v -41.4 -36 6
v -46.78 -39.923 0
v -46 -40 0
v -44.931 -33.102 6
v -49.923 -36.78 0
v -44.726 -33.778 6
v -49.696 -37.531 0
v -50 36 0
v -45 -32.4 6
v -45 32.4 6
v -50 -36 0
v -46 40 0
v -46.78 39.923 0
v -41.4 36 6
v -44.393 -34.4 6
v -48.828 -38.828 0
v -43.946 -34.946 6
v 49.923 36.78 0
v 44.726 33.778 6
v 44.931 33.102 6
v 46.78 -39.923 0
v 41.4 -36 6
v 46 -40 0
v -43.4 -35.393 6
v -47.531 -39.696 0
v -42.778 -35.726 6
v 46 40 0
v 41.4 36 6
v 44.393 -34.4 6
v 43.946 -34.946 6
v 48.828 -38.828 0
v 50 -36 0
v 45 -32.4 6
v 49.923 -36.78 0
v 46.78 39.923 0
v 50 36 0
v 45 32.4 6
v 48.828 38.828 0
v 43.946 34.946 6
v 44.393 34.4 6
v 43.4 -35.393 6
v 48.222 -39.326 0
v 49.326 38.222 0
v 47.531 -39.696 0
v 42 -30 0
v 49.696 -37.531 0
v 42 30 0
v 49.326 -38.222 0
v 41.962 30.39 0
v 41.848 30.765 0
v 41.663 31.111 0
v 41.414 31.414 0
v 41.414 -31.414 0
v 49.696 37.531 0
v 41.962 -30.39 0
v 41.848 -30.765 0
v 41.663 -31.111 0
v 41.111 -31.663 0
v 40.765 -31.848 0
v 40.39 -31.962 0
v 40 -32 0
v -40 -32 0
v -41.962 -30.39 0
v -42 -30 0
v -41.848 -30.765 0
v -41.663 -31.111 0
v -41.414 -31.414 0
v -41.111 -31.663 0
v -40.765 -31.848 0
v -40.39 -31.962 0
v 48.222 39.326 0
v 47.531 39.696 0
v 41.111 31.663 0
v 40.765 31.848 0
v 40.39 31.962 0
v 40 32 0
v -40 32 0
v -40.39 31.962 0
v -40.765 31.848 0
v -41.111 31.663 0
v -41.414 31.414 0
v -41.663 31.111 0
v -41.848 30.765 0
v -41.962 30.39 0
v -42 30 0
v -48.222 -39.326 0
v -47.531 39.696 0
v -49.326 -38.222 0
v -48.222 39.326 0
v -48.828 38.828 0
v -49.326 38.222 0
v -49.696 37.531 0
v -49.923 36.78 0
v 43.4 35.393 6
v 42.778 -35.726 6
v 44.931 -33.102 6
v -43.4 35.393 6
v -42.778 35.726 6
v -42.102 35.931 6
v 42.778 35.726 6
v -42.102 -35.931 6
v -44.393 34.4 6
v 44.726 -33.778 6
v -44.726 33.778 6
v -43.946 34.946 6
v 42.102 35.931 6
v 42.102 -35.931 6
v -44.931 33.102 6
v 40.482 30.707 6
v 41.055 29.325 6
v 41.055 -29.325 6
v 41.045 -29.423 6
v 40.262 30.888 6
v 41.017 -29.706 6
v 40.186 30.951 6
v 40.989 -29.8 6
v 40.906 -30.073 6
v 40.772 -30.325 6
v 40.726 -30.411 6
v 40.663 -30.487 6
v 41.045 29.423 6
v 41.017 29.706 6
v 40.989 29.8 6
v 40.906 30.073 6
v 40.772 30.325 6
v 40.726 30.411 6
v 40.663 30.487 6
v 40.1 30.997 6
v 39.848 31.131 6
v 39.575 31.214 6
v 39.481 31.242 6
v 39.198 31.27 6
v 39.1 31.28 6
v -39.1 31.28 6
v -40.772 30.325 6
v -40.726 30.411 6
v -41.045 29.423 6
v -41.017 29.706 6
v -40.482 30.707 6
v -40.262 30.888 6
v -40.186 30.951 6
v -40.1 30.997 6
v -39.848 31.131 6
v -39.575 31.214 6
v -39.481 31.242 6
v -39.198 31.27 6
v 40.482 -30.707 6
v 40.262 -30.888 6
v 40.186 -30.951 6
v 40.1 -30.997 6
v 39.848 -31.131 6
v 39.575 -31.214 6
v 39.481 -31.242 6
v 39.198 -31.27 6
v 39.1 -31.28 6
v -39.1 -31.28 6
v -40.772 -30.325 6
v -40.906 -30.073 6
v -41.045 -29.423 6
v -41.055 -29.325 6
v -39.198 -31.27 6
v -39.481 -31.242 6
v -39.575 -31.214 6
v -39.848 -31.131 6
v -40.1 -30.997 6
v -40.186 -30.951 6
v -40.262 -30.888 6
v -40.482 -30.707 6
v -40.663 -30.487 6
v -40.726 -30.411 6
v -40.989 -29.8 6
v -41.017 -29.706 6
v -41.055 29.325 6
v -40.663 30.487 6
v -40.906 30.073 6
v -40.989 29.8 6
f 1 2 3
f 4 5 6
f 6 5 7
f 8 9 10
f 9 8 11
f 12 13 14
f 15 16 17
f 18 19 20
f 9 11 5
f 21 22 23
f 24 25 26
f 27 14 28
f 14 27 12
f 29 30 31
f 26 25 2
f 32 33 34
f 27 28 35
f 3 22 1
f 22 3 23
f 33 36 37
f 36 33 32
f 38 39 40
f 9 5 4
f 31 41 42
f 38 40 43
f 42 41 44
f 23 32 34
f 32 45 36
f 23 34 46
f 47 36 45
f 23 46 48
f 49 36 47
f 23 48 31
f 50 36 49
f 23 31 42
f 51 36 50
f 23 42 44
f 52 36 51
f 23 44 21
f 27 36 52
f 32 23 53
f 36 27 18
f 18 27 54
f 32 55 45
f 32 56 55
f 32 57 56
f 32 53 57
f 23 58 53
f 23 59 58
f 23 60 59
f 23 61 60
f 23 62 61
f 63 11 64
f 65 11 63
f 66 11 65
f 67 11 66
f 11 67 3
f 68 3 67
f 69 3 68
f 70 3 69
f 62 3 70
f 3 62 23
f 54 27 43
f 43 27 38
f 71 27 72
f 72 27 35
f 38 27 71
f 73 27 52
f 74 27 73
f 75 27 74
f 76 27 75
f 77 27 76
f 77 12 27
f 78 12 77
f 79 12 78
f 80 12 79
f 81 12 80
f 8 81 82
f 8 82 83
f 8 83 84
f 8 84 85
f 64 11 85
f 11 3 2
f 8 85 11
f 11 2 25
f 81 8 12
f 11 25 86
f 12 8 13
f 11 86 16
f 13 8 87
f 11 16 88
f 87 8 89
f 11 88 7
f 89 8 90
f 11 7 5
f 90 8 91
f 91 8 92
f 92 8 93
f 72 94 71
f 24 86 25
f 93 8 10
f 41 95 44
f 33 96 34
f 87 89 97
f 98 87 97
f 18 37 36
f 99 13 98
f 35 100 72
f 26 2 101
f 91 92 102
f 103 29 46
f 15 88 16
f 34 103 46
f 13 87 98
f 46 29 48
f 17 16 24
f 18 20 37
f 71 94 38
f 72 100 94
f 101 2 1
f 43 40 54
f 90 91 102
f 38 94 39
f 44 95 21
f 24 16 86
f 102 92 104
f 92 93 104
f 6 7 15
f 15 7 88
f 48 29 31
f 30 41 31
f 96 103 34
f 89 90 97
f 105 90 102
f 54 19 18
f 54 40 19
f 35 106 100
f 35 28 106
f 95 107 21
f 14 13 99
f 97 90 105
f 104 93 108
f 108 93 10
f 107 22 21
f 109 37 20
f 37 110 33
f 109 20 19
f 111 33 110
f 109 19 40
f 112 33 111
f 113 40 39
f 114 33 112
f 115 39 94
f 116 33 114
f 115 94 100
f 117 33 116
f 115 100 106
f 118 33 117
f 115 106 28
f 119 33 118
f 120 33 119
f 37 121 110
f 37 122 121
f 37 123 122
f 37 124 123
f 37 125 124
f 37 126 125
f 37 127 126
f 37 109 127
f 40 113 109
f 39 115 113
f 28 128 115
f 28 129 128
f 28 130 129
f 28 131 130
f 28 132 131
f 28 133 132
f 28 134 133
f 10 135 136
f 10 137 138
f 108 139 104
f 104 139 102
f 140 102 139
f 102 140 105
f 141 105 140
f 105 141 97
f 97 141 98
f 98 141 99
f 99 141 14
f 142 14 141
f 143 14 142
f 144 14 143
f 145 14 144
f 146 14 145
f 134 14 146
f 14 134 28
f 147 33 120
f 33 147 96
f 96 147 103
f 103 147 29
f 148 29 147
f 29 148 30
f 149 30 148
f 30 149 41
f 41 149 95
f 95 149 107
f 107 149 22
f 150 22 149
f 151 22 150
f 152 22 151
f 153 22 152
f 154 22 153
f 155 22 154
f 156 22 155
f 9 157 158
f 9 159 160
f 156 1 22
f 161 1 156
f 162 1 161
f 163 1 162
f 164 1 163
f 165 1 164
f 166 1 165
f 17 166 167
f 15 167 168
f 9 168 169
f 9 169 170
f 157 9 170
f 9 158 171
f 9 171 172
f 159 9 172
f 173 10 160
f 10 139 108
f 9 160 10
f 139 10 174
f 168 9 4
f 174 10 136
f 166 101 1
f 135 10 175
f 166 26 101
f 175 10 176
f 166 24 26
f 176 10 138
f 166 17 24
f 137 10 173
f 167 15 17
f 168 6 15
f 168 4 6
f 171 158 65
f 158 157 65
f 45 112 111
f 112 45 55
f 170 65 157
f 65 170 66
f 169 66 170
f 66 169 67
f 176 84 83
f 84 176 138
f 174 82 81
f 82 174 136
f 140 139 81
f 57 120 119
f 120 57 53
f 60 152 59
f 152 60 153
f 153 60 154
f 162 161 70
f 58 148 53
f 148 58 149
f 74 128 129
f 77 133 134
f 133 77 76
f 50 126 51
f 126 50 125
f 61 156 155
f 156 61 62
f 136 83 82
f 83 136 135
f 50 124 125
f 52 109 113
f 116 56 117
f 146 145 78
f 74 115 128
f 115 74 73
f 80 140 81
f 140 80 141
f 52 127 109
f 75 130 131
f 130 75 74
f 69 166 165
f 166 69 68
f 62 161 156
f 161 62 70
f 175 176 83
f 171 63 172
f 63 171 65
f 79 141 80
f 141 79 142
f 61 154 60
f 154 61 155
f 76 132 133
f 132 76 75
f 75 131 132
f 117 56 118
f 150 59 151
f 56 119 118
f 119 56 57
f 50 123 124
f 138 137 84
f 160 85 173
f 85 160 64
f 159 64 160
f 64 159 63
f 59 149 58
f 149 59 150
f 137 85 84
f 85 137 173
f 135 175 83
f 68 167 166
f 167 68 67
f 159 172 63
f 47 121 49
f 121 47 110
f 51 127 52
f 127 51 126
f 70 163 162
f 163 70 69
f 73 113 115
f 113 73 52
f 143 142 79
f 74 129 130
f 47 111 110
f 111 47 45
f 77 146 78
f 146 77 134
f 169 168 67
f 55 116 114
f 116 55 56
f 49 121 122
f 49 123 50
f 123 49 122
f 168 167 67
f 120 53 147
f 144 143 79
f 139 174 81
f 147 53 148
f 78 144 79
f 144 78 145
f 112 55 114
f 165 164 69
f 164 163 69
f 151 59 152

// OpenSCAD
$fn = 32;

// ----------------------------------------------------------------------
// Display bezel: 100 x 80 mm frame, opening 84x64 mm
// ----------------------------------------------------------------------

// --- parameters (mm) ---
length = 100;             // frame outside length, X
width = 80;               // frame outside width, Y
frame_w = 8;              // frame width
thickness = 6;            // frame thickness
corner_r = 4;             // outside corner radius
chamfer = 0.9;            // outer wall taper
funnel = 0.97;            // inner opening taper
opening_l = 84;           // opening length
opening_w = 64;           // opening width
inner_r = 2;              // opening corner radius

/* rounded-rectangle outlines, generated with loops */
module rounded_ring(l_nom, w_nom, r) {
  hull() {
    for (sx = [-1, 1]) for (sy = [-1, 1])
      translate([sx * (l_nom / 2 - r), sy * (w_nom / 2 - r)]) circle(r = r);
  }
}

difference() {
  /* frame body, drafted so the outer edge is a variable-depth chamfer */
  linear_extrude(height = thickness, scale = chamfer)
    rounded_ring(length, width, corner_r);
  /* viewing opening, drafted the other way for a funnel edge */
  linear_extrude(height = thickness + 2, scale = funnel)
    translate([0, 0, -1]) rounded_ring(opening_l, opening_w, inner_r);
}
